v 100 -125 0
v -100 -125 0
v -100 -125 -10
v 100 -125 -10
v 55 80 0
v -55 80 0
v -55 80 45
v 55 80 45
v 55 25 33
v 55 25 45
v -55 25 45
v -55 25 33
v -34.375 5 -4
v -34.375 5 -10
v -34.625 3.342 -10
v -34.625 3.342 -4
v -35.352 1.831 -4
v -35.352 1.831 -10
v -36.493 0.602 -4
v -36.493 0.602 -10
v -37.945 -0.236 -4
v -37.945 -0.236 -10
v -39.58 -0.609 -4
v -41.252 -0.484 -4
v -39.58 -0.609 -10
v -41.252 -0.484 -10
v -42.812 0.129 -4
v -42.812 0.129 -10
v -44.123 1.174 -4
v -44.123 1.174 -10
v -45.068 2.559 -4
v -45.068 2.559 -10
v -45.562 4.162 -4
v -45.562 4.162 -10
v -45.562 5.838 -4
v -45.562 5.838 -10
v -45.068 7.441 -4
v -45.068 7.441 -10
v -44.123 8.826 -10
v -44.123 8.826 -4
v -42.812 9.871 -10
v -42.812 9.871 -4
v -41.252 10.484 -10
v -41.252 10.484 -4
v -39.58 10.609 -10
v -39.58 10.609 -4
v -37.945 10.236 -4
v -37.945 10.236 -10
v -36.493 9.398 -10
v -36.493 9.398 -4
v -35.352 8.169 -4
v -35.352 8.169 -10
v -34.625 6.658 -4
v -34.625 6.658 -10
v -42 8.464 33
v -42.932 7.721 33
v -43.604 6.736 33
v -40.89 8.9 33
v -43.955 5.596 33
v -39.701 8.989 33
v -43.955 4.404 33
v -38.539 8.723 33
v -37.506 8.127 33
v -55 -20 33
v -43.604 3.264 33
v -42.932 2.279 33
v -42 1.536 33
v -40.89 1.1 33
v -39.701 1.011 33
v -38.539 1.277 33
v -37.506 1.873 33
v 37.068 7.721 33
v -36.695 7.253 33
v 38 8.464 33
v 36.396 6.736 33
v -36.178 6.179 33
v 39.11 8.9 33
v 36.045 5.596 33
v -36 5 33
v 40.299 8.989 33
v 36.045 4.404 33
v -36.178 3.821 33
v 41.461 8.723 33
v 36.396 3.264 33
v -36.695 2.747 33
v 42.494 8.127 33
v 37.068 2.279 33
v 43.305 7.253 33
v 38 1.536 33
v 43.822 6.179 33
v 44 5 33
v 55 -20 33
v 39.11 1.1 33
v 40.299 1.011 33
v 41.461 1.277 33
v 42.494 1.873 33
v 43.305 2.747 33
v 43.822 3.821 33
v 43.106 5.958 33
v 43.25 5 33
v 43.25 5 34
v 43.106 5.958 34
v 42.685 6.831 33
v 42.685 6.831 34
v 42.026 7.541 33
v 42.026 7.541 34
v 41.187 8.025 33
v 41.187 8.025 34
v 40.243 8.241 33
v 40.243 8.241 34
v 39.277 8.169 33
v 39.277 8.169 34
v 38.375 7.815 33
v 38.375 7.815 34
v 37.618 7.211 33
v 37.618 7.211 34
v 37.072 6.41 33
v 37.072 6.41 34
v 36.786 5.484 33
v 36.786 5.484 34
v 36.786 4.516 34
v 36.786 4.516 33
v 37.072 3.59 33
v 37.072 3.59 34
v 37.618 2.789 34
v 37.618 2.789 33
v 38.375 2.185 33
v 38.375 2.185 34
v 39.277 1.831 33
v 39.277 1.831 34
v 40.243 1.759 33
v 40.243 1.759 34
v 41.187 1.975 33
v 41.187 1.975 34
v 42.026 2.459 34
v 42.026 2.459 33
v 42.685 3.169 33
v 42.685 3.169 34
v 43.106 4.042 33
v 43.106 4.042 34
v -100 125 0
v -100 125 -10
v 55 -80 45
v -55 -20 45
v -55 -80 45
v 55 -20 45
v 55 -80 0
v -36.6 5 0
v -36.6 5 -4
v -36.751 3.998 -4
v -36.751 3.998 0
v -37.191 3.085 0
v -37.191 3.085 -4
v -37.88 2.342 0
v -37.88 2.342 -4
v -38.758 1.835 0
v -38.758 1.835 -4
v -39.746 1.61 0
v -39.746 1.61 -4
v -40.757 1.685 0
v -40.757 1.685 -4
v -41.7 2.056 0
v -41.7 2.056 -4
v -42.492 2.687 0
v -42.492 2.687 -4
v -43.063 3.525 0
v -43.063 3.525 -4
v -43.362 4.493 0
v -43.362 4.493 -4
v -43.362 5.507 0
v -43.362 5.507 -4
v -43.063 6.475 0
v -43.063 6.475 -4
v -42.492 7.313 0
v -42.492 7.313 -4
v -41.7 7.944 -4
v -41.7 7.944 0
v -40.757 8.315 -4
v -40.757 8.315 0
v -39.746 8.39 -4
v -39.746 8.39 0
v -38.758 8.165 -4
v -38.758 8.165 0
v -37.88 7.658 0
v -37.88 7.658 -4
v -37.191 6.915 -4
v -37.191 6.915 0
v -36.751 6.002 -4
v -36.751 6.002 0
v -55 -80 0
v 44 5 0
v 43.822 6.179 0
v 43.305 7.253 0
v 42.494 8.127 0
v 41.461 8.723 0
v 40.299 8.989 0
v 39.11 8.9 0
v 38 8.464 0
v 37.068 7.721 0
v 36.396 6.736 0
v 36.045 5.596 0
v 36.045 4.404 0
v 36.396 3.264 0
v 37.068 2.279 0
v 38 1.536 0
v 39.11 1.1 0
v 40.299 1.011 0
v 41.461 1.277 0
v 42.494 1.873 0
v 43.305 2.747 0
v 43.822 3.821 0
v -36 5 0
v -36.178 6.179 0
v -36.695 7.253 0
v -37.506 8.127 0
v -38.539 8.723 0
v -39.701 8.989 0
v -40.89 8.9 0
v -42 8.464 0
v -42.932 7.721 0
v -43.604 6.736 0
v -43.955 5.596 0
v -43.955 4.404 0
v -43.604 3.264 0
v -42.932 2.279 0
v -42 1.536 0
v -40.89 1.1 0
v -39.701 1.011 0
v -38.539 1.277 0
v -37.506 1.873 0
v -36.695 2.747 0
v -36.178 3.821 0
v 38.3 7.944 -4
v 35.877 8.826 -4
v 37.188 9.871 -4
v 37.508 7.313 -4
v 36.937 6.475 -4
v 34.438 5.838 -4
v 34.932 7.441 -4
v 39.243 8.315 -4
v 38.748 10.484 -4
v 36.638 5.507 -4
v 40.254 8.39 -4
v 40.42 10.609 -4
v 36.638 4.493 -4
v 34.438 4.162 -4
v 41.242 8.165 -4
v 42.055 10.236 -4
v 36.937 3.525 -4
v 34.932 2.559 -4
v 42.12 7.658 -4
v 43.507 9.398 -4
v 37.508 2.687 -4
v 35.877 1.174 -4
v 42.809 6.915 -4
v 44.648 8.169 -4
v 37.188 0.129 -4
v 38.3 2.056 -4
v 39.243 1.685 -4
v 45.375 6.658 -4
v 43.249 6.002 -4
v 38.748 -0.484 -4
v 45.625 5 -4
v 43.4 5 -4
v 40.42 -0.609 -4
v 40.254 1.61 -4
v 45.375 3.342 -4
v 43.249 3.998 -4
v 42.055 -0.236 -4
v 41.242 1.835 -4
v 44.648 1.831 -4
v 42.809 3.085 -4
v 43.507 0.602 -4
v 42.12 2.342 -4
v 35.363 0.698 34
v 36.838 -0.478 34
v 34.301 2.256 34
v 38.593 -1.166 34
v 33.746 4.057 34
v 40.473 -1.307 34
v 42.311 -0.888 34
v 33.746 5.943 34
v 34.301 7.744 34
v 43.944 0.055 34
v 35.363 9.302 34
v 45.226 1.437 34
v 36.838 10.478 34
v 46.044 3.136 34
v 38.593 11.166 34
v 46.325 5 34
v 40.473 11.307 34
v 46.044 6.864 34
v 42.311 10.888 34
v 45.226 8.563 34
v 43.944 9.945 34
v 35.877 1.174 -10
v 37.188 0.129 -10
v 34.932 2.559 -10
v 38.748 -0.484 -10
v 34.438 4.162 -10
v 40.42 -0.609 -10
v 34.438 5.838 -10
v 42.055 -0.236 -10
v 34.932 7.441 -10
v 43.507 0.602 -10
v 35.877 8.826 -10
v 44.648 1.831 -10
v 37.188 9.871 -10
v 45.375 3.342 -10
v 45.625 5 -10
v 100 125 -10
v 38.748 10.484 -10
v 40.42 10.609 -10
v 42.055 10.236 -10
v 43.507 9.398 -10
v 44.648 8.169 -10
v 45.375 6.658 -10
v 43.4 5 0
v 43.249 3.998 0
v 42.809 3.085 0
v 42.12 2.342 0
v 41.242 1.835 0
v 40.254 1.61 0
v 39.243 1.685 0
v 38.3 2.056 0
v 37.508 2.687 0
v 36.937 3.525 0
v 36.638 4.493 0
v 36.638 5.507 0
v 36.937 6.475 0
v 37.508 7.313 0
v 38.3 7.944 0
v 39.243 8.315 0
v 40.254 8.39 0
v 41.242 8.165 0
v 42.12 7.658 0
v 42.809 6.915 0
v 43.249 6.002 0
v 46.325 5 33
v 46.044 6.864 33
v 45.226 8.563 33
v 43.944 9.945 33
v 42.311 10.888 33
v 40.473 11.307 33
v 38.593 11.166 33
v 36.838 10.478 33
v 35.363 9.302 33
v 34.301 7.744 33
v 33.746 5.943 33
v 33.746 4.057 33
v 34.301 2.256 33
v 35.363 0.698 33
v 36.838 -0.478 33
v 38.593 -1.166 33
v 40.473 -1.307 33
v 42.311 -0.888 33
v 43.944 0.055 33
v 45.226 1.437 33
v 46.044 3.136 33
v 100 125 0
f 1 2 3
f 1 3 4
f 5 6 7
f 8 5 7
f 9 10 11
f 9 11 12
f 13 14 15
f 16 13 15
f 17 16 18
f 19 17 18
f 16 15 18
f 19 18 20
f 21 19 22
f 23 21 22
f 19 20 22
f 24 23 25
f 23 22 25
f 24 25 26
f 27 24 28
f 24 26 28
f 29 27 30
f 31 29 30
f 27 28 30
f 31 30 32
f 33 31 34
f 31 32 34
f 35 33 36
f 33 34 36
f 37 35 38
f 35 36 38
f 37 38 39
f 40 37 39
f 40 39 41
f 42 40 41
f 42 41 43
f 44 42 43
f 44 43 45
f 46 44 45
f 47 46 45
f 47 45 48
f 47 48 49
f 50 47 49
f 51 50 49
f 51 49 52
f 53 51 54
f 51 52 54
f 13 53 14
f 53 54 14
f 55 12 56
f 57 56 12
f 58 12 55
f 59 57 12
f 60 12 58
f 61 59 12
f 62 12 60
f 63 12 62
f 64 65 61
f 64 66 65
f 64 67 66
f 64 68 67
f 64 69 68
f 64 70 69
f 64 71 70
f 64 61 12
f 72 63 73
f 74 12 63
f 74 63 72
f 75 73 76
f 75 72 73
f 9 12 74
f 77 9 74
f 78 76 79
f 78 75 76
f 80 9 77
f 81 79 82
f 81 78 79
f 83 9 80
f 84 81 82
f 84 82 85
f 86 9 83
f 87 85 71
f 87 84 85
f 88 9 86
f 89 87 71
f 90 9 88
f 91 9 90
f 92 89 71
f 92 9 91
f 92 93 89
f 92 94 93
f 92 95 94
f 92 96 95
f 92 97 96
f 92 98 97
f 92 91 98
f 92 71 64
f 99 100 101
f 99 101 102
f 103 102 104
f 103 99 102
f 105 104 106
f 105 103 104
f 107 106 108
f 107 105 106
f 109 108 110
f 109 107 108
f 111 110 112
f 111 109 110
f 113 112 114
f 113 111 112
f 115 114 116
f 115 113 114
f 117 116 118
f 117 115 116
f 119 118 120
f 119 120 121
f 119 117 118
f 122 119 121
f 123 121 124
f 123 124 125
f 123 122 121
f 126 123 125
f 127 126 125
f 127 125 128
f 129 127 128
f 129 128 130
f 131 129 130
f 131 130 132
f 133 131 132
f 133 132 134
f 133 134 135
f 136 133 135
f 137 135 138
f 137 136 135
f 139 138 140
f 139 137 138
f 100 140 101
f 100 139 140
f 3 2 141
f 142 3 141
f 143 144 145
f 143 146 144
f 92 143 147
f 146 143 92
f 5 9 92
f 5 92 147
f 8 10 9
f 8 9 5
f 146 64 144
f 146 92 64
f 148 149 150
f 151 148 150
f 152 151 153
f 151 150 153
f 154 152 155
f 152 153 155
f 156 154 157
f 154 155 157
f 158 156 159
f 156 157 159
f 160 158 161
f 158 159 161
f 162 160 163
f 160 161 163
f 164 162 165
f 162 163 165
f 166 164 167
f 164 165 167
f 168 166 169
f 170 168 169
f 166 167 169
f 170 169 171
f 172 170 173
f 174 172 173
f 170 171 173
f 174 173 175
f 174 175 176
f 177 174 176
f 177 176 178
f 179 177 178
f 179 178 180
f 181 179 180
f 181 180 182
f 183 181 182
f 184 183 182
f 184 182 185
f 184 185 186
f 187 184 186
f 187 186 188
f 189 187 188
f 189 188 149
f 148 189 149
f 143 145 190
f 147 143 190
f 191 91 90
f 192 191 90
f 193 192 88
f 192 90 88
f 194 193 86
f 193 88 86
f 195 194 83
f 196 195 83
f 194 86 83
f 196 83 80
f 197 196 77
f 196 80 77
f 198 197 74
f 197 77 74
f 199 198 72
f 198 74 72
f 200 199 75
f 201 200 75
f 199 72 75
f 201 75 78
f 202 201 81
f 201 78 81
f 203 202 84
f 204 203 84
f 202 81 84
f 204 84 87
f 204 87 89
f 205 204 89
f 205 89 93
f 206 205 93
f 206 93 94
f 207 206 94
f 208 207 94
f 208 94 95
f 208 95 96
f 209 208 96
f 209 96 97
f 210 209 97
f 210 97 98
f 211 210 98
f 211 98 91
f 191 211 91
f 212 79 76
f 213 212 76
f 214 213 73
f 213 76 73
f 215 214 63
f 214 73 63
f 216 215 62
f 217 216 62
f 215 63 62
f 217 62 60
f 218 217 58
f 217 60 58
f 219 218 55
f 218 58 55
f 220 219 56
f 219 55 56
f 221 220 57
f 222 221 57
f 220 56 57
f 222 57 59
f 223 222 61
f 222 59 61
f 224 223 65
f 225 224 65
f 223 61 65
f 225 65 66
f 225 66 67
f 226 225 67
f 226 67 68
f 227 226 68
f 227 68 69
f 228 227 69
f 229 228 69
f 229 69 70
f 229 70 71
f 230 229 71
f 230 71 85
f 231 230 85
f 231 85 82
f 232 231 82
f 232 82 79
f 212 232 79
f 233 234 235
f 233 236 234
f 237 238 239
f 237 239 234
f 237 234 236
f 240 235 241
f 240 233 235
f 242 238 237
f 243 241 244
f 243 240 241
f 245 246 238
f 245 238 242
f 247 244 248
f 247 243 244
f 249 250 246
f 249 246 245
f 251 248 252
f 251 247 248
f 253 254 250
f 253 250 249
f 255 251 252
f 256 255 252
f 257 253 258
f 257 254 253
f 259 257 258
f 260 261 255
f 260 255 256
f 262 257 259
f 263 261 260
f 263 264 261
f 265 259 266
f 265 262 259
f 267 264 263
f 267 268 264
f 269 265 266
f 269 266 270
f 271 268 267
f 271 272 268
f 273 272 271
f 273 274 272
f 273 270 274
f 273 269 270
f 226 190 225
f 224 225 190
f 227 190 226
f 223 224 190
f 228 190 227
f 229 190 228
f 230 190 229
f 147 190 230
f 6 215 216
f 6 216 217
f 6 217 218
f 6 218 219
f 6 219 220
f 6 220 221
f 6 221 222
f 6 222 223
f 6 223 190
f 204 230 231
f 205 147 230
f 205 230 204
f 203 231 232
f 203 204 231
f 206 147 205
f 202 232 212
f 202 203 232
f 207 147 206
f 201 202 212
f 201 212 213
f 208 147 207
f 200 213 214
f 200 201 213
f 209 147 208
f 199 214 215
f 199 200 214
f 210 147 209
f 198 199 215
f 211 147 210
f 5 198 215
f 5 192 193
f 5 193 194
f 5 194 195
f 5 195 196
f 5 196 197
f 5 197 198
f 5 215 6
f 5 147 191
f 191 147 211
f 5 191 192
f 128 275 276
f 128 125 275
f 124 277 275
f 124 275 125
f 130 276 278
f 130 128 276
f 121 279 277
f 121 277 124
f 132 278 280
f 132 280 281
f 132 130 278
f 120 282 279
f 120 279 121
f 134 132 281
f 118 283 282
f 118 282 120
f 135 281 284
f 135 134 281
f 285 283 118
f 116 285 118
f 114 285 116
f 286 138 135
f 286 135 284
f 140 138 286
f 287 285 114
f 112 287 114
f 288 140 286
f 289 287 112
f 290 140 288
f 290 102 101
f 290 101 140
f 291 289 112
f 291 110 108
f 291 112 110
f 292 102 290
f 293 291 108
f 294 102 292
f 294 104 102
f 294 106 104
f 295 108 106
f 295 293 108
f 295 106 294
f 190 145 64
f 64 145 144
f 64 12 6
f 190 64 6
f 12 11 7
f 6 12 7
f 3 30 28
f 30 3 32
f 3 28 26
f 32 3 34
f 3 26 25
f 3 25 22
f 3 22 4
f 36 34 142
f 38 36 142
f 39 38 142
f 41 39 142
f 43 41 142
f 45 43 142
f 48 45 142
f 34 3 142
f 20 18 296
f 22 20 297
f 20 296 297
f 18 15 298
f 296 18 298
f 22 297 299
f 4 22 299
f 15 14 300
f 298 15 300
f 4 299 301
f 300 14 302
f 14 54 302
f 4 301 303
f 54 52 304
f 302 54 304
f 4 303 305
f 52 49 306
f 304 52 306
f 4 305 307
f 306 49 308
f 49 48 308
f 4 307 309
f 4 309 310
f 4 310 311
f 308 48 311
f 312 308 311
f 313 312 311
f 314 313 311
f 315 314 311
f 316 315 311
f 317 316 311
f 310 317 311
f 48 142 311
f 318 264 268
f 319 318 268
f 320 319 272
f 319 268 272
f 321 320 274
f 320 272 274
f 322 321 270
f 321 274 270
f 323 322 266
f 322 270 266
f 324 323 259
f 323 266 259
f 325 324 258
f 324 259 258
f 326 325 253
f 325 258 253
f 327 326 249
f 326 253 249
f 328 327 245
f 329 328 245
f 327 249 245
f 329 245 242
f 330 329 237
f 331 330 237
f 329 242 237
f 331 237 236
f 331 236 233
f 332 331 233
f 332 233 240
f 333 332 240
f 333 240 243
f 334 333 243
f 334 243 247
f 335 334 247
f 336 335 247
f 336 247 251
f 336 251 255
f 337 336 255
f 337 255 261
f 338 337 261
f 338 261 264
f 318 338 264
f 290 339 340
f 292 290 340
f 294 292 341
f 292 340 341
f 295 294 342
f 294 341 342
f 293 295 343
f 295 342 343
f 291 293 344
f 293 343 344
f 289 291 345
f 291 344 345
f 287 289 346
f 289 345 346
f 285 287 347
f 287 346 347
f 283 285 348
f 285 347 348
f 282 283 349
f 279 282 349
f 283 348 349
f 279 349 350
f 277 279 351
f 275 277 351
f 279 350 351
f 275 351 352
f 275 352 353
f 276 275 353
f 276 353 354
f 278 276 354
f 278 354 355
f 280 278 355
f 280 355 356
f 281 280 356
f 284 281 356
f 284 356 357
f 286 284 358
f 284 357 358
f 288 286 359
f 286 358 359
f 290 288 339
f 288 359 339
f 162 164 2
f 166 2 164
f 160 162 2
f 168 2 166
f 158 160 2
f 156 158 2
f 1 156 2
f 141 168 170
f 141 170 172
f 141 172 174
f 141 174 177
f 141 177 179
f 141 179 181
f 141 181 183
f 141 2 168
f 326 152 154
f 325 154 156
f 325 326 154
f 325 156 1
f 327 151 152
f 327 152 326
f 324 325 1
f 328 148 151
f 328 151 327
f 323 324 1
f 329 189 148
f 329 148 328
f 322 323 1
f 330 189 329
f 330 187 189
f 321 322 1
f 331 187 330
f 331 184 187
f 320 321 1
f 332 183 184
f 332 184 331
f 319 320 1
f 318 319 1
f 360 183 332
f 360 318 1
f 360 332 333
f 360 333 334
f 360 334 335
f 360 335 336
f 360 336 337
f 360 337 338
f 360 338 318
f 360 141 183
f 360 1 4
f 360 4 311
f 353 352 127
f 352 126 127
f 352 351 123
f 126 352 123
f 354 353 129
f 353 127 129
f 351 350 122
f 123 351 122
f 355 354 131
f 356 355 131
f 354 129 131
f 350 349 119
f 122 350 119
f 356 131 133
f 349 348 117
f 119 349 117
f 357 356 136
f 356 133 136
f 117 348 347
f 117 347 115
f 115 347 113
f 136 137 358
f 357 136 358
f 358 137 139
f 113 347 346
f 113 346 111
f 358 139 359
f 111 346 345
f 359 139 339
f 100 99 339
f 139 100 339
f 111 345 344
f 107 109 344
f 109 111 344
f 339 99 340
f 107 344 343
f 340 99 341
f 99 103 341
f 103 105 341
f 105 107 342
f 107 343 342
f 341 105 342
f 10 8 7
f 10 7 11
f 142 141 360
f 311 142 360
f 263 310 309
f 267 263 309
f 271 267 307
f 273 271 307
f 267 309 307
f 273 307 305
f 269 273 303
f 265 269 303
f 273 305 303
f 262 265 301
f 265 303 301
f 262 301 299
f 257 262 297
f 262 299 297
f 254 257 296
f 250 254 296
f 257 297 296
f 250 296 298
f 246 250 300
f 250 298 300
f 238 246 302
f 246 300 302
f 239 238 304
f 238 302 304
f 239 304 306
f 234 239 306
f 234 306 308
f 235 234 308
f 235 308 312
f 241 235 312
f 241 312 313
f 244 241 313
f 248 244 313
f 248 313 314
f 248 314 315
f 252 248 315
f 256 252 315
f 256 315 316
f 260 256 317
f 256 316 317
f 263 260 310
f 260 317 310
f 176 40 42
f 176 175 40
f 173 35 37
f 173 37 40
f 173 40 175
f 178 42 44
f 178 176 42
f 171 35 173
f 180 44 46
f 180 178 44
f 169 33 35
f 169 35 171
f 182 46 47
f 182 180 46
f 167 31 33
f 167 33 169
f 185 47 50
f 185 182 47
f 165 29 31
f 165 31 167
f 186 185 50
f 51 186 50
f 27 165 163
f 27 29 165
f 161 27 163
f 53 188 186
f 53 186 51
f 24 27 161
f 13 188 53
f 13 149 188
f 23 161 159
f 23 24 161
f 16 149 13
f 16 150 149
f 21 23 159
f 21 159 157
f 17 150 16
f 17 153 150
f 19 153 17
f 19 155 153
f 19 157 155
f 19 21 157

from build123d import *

# Parameters (mm, degrees)
F1_DEPTH  = 55
F2_R      = 4
F3_DEPTH  = 33.001
F4_W      = 200
F4_H      = 250
F5_DEPTH  = 10
F6_R      = 3.4
F8_DEPTH  = 10
F7_R      = 5.625
F9_DEPTH  = 6
F10_R     = 6.325
F10_R_2   = 3.25
F11_DEPTH = 1


with BuildPart() as f1:
    # F0 (on Right) → F1 (new body, symmetric)
    with BuildSketch(Plane.YZ):
        Polygon((-20, 45), (-80, 45), (-80, 0), (80, 0), (80, 45), (25, 45), (25, 33), (-20, 33), align=None)
    extrude(amount=F1_DEPTH, both=True)

    # F2 (on face) → F3 (cut, through all)
    with BuildSketch(Plane.XY.offset(33)):
        with Locations((-40, 5)):
            Circle(F2_R)
        with Locations((40, 5)):
            Circle(F2_R)
    extrude(amount=-F3_DEPTH, mode=Mode.SUBTRACT)


with BuildPart() as f5:
    # F4 (on Top) → F5 (new body)
    with BuildSketch(Plane.XY):
        Rectangle(F4_W, F4_H)
    extrude(amount=-F5_DEPTH)

    # F6 (on face) → F8 (cut, through all)
    with BuildSketch(Plane(origin=(0, 0, -10), x_dir=(1, 0, 0), z_dir=(0, 0, -1))):
        with Locations((-40, -5)):
            Circle(F6_R)
        with Locations((40, -5)):
            Circle(F6_R)
    extrude(amount=-F8_DEPTH, mode=Mode.SUBTRACT)

    # F7 (on face) → F9 (cut)
    with BuildSketch(Plane(origin=(0, 0, -10), x_dir=(1, 0, 0), z_dir=(0, 0, -1))):
        with Locations((-40, -5)):
            Circle(F7_R)
        with Locations((40, -5)):
            Circle(F7_R)
    extrude(amount=-F9_DEPTH, mode=Mode.SUBTRACT)


with BuildPart() as f11:
    # F10 (on face) → F11 (new body)
    with BuildSketch(Plane.XY.offset(33)):
        with Locations((40, 5)):
            Circle(F10_R)
        with Locations((40, 5)):
            Circle(F10_R_2, mode=Mode.SUBTRACT)
    extrude(amount=F11_DEPTH)


solid = Compound([f1.part, f5.part, f11.part])
